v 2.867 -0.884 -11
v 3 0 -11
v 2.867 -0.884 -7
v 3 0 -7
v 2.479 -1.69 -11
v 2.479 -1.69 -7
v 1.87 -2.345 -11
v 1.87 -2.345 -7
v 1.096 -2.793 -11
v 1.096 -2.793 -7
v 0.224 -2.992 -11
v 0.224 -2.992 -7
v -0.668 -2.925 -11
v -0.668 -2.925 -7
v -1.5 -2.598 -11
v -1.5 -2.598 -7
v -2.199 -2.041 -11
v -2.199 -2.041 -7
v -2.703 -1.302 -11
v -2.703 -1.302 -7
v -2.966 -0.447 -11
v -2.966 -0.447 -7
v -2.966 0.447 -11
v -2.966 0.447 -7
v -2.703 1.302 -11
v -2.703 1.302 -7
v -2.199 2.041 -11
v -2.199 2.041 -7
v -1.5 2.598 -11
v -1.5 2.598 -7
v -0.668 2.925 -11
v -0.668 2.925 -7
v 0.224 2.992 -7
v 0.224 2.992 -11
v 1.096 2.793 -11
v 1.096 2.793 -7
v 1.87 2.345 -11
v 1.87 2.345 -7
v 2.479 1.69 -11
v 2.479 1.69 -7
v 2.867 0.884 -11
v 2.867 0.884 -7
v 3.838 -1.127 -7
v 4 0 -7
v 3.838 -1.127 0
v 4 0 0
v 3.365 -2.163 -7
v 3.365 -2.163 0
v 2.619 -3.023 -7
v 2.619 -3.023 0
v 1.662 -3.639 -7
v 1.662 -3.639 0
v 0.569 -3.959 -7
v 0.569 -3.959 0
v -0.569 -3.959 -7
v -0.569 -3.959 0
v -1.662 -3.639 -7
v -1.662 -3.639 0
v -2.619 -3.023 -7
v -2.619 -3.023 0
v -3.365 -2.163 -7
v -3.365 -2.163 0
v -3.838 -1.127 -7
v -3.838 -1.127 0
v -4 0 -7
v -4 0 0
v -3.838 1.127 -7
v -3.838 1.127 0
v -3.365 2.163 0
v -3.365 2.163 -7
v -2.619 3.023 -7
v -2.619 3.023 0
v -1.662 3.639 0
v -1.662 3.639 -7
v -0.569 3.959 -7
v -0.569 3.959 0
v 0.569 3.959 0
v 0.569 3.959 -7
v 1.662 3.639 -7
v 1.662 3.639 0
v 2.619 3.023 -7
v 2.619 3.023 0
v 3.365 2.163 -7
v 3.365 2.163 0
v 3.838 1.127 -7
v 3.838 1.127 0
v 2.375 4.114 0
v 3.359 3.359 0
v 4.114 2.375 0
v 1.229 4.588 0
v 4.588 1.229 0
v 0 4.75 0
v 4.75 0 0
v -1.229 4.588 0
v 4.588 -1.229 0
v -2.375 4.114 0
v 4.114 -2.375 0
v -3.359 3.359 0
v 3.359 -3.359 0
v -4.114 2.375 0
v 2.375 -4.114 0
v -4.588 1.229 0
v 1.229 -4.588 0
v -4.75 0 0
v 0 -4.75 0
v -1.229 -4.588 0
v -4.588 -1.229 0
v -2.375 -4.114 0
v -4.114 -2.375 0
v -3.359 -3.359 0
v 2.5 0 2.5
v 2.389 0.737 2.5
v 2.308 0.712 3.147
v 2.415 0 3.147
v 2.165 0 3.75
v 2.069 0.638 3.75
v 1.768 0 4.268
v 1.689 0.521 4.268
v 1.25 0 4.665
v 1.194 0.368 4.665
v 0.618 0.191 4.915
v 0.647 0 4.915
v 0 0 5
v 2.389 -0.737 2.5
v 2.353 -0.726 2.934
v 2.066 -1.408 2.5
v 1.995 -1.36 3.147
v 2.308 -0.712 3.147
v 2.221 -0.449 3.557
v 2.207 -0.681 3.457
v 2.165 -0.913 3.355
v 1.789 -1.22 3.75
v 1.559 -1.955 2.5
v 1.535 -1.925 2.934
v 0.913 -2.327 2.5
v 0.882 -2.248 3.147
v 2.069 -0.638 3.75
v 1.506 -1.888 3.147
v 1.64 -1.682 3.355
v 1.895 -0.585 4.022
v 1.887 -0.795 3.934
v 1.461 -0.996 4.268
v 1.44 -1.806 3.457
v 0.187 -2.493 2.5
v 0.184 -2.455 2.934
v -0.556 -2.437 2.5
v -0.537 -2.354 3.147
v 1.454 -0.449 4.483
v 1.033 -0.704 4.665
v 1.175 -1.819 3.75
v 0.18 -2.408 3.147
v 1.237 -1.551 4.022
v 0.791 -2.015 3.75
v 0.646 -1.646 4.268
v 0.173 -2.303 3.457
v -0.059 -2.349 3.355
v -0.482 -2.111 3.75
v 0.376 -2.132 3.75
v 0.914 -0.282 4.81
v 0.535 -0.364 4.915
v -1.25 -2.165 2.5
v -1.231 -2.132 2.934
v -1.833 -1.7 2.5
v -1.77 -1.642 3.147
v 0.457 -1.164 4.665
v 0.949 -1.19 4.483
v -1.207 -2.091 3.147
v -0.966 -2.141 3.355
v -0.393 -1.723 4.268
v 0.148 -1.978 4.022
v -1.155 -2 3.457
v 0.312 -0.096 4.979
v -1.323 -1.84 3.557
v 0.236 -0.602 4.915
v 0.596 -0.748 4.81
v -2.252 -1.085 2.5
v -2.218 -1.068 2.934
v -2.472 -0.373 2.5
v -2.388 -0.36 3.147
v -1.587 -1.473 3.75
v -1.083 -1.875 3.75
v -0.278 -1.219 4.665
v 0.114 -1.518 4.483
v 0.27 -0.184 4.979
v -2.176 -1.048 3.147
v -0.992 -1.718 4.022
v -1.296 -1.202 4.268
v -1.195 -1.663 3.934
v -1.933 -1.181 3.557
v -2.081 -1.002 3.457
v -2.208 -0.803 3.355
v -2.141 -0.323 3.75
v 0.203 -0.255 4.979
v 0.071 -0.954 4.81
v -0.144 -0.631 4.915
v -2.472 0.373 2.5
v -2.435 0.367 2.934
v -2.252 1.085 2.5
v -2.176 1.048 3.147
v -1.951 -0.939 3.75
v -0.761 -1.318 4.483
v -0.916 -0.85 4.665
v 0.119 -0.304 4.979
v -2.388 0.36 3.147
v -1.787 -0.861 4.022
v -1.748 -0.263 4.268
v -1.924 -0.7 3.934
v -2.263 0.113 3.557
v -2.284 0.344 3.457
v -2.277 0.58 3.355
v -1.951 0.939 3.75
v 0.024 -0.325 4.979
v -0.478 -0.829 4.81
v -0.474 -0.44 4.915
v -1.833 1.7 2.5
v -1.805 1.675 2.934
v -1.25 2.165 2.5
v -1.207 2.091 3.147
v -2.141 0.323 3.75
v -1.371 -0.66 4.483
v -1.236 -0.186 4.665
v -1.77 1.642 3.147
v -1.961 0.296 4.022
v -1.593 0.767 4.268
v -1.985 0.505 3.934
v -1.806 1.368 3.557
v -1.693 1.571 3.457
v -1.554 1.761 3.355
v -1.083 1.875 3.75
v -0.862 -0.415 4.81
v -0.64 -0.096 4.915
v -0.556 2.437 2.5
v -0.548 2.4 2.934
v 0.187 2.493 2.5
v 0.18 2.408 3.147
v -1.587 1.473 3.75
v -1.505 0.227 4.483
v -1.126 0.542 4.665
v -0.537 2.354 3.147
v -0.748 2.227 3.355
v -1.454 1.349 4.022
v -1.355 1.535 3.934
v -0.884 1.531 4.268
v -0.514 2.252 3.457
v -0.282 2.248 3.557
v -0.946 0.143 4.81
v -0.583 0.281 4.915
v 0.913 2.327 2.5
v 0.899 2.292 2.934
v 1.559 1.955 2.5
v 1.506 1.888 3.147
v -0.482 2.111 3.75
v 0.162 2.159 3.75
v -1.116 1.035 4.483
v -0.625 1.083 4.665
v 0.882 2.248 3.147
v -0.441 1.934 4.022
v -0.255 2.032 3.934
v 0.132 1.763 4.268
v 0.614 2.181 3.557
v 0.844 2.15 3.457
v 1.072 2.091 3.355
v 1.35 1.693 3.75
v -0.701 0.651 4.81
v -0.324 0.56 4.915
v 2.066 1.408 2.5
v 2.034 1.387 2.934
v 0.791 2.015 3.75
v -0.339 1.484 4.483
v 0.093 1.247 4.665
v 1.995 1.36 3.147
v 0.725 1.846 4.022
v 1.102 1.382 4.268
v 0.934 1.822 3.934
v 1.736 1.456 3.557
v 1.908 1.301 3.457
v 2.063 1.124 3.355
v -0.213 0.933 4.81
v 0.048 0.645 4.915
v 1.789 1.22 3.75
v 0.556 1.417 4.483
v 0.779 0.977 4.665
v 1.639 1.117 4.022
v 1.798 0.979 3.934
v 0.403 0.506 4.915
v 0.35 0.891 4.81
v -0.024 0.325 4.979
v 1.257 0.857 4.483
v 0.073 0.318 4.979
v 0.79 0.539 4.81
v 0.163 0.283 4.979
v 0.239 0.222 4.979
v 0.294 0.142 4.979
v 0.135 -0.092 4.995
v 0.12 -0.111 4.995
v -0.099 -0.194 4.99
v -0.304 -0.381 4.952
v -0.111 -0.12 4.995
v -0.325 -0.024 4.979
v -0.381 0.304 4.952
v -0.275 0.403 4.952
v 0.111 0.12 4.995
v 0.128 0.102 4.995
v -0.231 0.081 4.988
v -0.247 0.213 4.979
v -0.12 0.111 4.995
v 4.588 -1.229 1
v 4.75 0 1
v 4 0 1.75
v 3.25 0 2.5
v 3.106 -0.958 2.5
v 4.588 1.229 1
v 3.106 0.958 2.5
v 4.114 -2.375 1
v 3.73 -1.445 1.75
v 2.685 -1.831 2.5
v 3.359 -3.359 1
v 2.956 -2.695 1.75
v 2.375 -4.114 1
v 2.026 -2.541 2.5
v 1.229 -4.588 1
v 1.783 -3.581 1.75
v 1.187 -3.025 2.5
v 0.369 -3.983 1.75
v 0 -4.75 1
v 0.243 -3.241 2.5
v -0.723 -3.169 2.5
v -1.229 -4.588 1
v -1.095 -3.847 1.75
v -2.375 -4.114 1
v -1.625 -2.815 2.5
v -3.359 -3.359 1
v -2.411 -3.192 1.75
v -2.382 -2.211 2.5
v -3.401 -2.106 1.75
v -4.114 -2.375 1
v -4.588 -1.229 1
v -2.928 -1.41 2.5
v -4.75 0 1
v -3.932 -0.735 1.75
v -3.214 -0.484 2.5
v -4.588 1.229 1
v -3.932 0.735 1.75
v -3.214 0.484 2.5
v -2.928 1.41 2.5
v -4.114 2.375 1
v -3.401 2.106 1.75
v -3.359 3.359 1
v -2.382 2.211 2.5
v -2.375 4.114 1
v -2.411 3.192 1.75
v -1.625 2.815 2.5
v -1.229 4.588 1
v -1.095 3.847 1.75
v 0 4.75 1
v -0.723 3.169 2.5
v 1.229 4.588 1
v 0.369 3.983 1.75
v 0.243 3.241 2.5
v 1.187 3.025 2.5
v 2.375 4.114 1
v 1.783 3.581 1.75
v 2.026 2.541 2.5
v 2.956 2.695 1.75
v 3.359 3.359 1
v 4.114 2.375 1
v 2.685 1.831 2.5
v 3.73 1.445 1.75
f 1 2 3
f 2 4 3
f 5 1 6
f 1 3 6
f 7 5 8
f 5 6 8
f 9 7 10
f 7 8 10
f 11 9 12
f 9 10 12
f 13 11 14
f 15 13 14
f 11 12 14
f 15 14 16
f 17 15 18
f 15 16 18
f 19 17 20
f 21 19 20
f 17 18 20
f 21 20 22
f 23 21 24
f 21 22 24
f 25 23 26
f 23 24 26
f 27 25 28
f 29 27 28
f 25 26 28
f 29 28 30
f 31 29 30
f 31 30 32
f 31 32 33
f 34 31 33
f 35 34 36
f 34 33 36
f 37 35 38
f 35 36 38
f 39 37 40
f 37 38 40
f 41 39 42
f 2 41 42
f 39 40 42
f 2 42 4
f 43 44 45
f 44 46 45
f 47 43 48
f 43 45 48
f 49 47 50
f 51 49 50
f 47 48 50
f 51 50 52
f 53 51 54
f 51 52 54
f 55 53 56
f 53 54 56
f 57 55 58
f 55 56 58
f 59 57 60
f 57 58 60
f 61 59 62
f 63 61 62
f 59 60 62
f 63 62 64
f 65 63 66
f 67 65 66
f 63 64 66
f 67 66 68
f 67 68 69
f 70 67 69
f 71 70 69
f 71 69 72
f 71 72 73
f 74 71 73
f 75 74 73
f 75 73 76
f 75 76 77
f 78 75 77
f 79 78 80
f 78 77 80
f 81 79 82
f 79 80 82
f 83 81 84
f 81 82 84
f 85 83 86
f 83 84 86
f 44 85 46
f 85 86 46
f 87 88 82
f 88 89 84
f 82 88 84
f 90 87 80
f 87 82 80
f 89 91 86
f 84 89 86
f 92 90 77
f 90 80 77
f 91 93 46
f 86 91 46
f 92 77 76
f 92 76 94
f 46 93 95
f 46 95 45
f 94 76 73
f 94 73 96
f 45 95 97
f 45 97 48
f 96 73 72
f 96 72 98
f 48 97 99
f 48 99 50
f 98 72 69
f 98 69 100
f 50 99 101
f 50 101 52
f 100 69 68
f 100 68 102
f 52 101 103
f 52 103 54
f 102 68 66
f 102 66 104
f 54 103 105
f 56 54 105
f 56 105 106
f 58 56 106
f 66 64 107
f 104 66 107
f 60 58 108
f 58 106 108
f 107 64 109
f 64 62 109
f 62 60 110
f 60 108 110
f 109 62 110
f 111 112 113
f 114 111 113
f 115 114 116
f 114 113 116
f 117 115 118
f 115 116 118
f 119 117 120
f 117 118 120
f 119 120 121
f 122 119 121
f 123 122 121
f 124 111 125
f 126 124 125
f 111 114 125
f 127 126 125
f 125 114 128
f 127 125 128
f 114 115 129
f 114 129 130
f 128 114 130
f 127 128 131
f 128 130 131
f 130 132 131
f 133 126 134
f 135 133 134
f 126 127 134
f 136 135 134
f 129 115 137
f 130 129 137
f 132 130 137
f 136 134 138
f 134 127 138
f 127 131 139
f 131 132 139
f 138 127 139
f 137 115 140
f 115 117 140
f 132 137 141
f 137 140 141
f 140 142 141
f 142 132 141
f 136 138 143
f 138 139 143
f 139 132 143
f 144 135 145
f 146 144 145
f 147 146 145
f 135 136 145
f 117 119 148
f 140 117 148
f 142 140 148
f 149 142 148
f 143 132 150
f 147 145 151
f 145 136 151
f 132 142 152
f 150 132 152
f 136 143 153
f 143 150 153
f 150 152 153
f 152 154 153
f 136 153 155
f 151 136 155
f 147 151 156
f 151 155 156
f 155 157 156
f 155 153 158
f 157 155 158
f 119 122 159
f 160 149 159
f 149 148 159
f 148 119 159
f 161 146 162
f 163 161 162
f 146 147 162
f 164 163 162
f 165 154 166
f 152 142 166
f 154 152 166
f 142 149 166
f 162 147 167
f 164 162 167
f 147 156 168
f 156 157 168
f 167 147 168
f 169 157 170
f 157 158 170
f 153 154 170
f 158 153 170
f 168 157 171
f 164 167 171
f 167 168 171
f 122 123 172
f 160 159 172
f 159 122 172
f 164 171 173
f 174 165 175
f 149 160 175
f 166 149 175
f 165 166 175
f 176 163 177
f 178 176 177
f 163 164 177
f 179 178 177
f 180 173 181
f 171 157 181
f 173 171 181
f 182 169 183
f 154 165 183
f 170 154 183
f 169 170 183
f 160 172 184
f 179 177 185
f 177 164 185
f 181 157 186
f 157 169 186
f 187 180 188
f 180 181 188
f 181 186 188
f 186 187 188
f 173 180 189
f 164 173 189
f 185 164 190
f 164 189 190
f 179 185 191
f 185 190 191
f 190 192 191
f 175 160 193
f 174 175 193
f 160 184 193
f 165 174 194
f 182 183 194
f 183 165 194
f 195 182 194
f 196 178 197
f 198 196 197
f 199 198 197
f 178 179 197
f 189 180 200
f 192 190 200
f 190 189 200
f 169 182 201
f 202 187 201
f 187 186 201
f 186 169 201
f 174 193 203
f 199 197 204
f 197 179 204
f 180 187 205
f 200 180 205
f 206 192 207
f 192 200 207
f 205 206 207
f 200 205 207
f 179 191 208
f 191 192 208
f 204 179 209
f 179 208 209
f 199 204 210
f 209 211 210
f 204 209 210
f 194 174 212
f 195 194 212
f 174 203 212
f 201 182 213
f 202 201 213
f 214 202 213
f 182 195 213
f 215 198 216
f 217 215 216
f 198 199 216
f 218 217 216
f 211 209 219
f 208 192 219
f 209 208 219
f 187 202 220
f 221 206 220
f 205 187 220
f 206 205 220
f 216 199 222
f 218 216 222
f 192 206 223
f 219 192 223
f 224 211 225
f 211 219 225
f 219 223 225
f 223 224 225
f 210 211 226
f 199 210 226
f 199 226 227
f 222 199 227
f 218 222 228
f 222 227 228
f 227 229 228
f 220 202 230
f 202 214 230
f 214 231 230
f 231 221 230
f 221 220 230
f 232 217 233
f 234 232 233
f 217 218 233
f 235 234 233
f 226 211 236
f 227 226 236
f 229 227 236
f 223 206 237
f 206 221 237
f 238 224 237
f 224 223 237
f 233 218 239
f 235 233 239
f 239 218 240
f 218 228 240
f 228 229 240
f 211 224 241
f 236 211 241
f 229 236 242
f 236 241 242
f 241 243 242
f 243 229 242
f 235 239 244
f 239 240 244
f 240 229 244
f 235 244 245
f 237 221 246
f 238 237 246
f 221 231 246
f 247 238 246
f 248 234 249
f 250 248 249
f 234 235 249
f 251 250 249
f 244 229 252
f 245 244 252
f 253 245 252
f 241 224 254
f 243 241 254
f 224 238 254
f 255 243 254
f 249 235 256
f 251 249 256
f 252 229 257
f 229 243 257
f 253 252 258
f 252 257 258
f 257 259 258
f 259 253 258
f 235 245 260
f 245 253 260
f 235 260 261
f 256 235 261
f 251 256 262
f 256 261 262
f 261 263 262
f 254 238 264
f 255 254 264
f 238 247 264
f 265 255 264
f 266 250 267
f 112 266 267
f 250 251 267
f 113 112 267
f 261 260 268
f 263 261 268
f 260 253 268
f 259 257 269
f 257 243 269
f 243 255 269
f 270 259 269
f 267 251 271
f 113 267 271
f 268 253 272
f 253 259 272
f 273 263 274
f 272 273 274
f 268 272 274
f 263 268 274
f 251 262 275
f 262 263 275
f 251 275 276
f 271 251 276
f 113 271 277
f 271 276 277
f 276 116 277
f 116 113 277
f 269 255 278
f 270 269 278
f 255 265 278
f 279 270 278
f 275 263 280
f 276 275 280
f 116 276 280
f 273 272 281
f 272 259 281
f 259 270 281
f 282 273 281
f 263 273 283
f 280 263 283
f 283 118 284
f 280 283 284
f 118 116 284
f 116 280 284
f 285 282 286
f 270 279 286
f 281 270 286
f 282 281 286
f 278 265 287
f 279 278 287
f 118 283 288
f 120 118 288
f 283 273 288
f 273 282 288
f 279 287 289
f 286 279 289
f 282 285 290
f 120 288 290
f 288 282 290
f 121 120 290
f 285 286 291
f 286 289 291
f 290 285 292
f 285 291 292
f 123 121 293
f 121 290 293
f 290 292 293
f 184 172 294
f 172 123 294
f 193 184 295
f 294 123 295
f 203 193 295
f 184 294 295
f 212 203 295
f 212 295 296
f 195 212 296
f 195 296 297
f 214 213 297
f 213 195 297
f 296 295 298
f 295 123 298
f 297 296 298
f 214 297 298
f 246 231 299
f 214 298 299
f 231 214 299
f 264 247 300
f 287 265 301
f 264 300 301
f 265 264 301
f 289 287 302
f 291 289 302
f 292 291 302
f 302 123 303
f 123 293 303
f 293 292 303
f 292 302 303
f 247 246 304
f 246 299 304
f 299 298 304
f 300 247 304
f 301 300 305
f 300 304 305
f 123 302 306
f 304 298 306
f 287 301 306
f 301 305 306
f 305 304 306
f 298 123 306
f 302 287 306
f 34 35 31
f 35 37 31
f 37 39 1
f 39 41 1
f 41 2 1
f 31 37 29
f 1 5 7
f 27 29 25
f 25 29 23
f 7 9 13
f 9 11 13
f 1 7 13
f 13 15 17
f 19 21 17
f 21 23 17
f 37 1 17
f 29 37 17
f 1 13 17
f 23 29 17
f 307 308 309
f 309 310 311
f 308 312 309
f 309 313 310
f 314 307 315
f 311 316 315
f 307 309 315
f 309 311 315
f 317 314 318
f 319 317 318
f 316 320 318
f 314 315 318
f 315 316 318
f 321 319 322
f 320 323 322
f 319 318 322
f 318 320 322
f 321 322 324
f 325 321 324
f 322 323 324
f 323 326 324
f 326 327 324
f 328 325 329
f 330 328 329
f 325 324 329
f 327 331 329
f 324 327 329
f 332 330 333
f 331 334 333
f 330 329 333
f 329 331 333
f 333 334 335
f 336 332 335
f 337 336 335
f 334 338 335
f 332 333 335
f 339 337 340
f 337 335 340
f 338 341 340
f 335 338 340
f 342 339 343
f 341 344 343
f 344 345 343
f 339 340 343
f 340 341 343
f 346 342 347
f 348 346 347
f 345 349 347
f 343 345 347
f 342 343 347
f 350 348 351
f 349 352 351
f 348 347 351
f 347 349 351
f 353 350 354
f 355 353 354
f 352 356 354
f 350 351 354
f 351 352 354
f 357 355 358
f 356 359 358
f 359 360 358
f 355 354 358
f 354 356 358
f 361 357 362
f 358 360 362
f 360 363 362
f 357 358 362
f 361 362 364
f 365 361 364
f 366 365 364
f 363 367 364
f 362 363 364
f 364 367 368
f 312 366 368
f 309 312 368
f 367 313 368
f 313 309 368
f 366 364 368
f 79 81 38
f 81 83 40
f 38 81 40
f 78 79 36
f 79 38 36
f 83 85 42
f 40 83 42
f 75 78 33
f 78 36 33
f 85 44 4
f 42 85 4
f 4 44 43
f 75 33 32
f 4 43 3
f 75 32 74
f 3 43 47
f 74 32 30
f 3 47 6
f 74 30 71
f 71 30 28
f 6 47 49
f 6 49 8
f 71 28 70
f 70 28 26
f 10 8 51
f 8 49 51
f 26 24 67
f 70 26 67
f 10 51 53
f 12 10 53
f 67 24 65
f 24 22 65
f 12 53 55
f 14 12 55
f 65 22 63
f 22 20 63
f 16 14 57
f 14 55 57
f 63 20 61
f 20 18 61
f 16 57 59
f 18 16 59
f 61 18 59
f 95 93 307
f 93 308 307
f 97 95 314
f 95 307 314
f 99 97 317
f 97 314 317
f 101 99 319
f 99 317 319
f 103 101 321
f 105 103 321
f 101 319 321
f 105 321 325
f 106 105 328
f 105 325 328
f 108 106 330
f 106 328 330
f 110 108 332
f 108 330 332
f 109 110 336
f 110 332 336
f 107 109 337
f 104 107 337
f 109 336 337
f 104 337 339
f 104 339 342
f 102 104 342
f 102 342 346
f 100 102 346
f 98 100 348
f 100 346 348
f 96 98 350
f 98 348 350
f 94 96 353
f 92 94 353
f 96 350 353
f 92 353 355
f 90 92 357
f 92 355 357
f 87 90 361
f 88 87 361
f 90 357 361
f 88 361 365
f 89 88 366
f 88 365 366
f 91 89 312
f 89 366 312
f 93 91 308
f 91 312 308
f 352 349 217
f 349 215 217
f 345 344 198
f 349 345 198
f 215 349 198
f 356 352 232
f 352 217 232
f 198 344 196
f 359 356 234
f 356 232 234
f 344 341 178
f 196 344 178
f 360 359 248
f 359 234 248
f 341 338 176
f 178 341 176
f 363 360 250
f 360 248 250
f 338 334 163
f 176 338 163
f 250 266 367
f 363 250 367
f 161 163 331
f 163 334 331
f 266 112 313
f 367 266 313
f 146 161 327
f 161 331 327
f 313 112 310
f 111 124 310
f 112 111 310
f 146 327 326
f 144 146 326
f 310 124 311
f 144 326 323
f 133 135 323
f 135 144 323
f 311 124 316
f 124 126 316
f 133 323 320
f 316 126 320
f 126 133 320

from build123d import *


with BuildPart() as f1:
    # F0 (on Front) → F1 (revolve)
    with BuildSketch(Plane.XZ):
        with BuildLine():
            Line((3.25, 2.5), (2.5, 2.5))
            ThreePointArc((2.5, 2.5), (1.767767, 4.267767), (0, 5))
            Line((0, 5), (0, -7))
            Line((0, -7), (0, -11))
            Line((0, -11), (3, -11))
            Line((3, -11), (3, -7))
            Line((3, -7), (4, -7))
            Line((4, -7), (4, 0))
            Line((4, 0), (4.75, 0))
            Line((4.75, 0), (4.75, 1))
            Line((4.75, 1), (3.25, 2.5))
        make_face()
    revolve(axis=Axis((0, 0, -3.678168), (0, 0, -1)))


solid = f1.part
